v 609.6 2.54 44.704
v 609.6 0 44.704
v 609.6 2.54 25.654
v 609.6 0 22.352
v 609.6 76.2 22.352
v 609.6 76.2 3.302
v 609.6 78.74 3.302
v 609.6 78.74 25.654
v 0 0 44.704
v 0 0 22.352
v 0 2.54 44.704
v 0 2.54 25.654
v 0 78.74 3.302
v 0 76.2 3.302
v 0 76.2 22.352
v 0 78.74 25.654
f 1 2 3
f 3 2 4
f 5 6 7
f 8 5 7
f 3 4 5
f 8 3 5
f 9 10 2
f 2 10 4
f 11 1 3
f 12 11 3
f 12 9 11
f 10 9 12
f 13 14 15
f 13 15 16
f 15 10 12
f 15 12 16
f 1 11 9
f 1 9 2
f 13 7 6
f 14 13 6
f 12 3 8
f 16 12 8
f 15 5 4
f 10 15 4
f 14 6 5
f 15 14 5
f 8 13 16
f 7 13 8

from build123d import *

# Parameters (mm, degrees)
SKETCH2_W           = 609.6
SKETCH2_H           = 78.74
BOSS_EXTRUDE1_DEPTH = 44.704
SKETCH4_W           = 19.05
SKETCH4_H           = 76.2
CUT_EXTRUDE1_DEPTH  = 617.287753583


with BuildPart() as part:
    # Sketch2 → Boss-Extrude1 (new body)
    with BuildSketch(Plane.XY):
        with Locations((304.8, 39.37)):
            Rectangle(SKETCH2_W, SKETCH2_H)
    extrude(amount=BOSS_EXTRUDE1_DEPTH)

    # Sketch4 → Cut-Extrude1 (cut, through all)
    with BuildSketch(Plane(origin=(609.6, 0, 0), x_dir=(0, 0, -1), z_dir=(1, 0, 0))):
        with Locations((-35.179, 40.64)):
            Rectangle(SKETCH4_W, SKETCH4_H)
        Polygon((0, 78.74), (-3.302, 78.74), (-3.302, 76.2), (-22.352, 76.2), (-22.352, 0), (0, 0), align=None)
    extrude(amount=-CUT_EXTRUDE1_DEPTH, mode=Mode.SUBTRACT)


solid = part.part
